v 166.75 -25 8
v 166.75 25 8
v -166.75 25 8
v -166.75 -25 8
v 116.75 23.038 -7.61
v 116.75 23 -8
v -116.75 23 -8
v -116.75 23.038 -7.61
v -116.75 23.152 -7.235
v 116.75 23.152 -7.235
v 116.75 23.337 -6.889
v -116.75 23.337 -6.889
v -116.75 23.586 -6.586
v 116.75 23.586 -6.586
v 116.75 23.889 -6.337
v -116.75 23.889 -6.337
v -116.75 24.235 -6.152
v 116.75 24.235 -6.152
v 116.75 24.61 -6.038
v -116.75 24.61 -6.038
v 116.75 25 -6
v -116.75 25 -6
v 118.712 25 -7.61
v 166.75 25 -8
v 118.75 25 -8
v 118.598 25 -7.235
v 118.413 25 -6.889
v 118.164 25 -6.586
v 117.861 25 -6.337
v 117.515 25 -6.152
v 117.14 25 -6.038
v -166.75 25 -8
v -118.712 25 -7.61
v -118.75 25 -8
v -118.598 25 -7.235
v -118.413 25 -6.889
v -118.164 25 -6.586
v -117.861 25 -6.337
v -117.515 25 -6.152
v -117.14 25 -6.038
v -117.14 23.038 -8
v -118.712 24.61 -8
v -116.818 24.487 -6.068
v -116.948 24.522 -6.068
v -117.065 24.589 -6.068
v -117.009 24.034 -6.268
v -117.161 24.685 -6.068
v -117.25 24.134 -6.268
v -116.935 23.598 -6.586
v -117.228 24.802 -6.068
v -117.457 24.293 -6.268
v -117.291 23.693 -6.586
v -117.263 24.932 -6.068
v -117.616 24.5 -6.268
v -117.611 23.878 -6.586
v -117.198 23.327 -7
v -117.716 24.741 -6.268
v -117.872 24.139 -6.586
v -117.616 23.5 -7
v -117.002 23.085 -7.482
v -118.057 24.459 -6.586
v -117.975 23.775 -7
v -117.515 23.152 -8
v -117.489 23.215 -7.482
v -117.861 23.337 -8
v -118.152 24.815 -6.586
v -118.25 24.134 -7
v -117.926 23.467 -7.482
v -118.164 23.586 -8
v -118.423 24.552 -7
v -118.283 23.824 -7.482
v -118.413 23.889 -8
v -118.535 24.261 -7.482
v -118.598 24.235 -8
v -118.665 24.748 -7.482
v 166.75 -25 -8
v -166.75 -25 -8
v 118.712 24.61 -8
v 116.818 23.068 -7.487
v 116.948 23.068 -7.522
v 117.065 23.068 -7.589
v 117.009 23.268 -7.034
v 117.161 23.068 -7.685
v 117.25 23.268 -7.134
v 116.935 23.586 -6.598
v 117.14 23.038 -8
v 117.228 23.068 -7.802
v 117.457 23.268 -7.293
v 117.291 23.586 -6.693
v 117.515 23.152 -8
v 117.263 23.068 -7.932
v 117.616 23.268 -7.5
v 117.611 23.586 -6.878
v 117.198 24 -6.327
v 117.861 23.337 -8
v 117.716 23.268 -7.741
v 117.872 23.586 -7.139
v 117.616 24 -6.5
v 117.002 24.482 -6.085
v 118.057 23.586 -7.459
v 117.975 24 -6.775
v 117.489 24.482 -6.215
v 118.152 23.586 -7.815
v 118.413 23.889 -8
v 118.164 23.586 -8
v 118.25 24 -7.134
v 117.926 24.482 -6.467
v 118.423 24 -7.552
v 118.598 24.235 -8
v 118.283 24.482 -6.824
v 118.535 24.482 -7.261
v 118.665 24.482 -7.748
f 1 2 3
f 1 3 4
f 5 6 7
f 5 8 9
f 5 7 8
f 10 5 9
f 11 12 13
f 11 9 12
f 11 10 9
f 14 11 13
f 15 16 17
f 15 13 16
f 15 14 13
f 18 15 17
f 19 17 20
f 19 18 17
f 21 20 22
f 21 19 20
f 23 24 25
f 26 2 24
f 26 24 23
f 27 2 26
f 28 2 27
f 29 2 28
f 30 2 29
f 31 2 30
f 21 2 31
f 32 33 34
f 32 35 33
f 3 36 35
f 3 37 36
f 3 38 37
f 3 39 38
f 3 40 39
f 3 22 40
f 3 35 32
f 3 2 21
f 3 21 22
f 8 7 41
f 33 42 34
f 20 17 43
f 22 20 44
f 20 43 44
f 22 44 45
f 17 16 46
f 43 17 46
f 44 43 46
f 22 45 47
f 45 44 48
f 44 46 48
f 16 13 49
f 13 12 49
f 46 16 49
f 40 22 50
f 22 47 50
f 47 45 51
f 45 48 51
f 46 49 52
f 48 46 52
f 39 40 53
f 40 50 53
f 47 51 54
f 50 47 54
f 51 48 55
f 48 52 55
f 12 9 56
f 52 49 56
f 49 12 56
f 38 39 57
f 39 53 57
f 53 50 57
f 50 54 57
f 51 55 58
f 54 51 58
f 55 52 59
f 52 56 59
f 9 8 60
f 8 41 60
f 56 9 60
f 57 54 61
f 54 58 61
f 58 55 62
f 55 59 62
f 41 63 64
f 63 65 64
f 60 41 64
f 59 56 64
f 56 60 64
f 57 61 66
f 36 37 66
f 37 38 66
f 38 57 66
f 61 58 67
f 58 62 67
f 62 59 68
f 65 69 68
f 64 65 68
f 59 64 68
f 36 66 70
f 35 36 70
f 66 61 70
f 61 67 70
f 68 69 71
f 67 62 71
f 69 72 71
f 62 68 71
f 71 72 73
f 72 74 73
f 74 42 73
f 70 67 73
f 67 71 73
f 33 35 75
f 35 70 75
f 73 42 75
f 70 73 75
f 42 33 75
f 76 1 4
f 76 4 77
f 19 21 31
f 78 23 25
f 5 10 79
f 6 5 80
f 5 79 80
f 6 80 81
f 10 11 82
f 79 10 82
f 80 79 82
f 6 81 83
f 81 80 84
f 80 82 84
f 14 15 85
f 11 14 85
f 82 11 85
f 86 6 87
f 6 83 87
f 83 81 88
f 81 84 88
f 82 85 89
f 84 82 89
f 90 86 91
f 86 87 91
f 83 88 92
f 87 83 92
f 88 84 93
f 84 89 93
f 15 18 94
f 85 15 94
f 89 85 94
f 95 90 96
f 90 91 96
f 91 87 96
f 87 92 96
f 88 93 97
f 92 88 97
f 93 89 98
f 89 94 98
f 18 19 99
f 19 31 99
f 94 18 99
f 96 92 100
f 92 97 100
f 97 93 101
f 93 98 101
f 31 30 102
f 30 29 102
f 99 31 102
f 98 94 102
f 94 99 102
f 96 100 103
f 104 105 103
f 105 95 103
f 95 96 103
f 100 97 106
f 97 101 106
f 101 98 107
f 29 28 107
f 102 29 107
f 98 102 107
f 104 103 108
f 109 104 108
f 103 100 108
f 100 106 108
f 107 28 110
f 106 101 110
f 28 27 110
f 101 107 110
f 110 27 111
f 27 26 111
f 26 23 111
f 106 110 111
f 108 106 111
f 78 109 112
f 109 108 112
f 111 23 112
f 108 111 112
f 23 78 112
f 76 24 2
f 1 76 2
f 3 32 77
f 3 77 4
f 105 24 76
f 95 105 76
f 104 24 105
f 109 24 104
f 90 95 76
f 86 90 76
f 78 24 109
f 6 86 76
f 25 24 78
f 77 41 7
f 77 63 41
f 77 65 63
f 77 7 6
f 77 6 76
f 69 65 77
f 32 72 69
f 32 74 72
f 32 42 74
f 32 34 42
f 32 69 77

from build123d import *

# Parameters (mm, degrees)
F1_DEPTH = 166.75
F2_W     = 50
F2_H     = 16
F3_DEPTH = 2
F4_W     = 50
F4_H     = 16
F5_DEPTH = 2


with BuildPart() as f1:
    # F0 (on Right) → F1 (new body, symmetric)
    with BuildSketch(Plane.YZ):
        with BuildLine():
            Line((25, -6), (25, 8))
            Line((25, 8), (-25, 8))
            Line((-25, 8), (-25, -8))
            Line((-25, -8), (23, -8))
            ThreePointArc((23, -8), (23.5857864376, -6.5857864376), (25, -6))
        make_face()
    extrude(amount=F1_DEPTH, both=True)

    # F2 (on face) → F3 (join)
    with BuildSketch(Plane(origin=(0, 25, 0), x_dir=(-1, 0, 0), z_dir=(0, 1, 0))):
        with Locations((-141.75, 0)):
            Rectangle(F2_W, F2_H)
    extrude(amount=-F3_DEPTH)

    # F4 (on face) → F5 (join)
    with BuildSketch(Plane(origin=(0, 25, 0), x_dir=(-1, 0, 0), z_dir=(0, 1, 0))):
        with Locations((141.75, 0)):
            Rectangle(F4_W, F4_H)
    extrude(amount=-F5_DEPTH)

    # F6 (on face) → F7 (revolve, cut)
    with BuildSketch(Plane(origin=(0, 0, -8), x_dir=(1, 0, 0), z_dir=(0, 0, -1))):
        with BuildLine():
            Line((116.75, -25), (116.75, -23))
            ThreePointArc((116.75, -23), (114.75, -25), (116.75, -27))
            Line((116.75, -27), (116.75, -25))
        make_face()
    revolve(axis=Axis((116.75, 25, -8), (0, 1, 0)), mode=Mode.SUBTRACT)

    # F8 (on face) → F9 (revolve, cut)
    with BuildSketch(Plane(origin=(0, 25, 0), x_dir=(-1, 0, 0), z_dir=(0, 1, 0))):
        with BuildLine():
            Line((116.75, -8), (116.75, -6))
            ThreePointArc((116.75, -6), (114.75, -8), (116.75, -10))
            Line((116.75, -10), (116.75, -8))
        make_face()
    revolve(axis=Axis((-116.75, 25, -8), (0, 0, -1)), mode=Mode.SUBTRACT)


solid = f1.part
